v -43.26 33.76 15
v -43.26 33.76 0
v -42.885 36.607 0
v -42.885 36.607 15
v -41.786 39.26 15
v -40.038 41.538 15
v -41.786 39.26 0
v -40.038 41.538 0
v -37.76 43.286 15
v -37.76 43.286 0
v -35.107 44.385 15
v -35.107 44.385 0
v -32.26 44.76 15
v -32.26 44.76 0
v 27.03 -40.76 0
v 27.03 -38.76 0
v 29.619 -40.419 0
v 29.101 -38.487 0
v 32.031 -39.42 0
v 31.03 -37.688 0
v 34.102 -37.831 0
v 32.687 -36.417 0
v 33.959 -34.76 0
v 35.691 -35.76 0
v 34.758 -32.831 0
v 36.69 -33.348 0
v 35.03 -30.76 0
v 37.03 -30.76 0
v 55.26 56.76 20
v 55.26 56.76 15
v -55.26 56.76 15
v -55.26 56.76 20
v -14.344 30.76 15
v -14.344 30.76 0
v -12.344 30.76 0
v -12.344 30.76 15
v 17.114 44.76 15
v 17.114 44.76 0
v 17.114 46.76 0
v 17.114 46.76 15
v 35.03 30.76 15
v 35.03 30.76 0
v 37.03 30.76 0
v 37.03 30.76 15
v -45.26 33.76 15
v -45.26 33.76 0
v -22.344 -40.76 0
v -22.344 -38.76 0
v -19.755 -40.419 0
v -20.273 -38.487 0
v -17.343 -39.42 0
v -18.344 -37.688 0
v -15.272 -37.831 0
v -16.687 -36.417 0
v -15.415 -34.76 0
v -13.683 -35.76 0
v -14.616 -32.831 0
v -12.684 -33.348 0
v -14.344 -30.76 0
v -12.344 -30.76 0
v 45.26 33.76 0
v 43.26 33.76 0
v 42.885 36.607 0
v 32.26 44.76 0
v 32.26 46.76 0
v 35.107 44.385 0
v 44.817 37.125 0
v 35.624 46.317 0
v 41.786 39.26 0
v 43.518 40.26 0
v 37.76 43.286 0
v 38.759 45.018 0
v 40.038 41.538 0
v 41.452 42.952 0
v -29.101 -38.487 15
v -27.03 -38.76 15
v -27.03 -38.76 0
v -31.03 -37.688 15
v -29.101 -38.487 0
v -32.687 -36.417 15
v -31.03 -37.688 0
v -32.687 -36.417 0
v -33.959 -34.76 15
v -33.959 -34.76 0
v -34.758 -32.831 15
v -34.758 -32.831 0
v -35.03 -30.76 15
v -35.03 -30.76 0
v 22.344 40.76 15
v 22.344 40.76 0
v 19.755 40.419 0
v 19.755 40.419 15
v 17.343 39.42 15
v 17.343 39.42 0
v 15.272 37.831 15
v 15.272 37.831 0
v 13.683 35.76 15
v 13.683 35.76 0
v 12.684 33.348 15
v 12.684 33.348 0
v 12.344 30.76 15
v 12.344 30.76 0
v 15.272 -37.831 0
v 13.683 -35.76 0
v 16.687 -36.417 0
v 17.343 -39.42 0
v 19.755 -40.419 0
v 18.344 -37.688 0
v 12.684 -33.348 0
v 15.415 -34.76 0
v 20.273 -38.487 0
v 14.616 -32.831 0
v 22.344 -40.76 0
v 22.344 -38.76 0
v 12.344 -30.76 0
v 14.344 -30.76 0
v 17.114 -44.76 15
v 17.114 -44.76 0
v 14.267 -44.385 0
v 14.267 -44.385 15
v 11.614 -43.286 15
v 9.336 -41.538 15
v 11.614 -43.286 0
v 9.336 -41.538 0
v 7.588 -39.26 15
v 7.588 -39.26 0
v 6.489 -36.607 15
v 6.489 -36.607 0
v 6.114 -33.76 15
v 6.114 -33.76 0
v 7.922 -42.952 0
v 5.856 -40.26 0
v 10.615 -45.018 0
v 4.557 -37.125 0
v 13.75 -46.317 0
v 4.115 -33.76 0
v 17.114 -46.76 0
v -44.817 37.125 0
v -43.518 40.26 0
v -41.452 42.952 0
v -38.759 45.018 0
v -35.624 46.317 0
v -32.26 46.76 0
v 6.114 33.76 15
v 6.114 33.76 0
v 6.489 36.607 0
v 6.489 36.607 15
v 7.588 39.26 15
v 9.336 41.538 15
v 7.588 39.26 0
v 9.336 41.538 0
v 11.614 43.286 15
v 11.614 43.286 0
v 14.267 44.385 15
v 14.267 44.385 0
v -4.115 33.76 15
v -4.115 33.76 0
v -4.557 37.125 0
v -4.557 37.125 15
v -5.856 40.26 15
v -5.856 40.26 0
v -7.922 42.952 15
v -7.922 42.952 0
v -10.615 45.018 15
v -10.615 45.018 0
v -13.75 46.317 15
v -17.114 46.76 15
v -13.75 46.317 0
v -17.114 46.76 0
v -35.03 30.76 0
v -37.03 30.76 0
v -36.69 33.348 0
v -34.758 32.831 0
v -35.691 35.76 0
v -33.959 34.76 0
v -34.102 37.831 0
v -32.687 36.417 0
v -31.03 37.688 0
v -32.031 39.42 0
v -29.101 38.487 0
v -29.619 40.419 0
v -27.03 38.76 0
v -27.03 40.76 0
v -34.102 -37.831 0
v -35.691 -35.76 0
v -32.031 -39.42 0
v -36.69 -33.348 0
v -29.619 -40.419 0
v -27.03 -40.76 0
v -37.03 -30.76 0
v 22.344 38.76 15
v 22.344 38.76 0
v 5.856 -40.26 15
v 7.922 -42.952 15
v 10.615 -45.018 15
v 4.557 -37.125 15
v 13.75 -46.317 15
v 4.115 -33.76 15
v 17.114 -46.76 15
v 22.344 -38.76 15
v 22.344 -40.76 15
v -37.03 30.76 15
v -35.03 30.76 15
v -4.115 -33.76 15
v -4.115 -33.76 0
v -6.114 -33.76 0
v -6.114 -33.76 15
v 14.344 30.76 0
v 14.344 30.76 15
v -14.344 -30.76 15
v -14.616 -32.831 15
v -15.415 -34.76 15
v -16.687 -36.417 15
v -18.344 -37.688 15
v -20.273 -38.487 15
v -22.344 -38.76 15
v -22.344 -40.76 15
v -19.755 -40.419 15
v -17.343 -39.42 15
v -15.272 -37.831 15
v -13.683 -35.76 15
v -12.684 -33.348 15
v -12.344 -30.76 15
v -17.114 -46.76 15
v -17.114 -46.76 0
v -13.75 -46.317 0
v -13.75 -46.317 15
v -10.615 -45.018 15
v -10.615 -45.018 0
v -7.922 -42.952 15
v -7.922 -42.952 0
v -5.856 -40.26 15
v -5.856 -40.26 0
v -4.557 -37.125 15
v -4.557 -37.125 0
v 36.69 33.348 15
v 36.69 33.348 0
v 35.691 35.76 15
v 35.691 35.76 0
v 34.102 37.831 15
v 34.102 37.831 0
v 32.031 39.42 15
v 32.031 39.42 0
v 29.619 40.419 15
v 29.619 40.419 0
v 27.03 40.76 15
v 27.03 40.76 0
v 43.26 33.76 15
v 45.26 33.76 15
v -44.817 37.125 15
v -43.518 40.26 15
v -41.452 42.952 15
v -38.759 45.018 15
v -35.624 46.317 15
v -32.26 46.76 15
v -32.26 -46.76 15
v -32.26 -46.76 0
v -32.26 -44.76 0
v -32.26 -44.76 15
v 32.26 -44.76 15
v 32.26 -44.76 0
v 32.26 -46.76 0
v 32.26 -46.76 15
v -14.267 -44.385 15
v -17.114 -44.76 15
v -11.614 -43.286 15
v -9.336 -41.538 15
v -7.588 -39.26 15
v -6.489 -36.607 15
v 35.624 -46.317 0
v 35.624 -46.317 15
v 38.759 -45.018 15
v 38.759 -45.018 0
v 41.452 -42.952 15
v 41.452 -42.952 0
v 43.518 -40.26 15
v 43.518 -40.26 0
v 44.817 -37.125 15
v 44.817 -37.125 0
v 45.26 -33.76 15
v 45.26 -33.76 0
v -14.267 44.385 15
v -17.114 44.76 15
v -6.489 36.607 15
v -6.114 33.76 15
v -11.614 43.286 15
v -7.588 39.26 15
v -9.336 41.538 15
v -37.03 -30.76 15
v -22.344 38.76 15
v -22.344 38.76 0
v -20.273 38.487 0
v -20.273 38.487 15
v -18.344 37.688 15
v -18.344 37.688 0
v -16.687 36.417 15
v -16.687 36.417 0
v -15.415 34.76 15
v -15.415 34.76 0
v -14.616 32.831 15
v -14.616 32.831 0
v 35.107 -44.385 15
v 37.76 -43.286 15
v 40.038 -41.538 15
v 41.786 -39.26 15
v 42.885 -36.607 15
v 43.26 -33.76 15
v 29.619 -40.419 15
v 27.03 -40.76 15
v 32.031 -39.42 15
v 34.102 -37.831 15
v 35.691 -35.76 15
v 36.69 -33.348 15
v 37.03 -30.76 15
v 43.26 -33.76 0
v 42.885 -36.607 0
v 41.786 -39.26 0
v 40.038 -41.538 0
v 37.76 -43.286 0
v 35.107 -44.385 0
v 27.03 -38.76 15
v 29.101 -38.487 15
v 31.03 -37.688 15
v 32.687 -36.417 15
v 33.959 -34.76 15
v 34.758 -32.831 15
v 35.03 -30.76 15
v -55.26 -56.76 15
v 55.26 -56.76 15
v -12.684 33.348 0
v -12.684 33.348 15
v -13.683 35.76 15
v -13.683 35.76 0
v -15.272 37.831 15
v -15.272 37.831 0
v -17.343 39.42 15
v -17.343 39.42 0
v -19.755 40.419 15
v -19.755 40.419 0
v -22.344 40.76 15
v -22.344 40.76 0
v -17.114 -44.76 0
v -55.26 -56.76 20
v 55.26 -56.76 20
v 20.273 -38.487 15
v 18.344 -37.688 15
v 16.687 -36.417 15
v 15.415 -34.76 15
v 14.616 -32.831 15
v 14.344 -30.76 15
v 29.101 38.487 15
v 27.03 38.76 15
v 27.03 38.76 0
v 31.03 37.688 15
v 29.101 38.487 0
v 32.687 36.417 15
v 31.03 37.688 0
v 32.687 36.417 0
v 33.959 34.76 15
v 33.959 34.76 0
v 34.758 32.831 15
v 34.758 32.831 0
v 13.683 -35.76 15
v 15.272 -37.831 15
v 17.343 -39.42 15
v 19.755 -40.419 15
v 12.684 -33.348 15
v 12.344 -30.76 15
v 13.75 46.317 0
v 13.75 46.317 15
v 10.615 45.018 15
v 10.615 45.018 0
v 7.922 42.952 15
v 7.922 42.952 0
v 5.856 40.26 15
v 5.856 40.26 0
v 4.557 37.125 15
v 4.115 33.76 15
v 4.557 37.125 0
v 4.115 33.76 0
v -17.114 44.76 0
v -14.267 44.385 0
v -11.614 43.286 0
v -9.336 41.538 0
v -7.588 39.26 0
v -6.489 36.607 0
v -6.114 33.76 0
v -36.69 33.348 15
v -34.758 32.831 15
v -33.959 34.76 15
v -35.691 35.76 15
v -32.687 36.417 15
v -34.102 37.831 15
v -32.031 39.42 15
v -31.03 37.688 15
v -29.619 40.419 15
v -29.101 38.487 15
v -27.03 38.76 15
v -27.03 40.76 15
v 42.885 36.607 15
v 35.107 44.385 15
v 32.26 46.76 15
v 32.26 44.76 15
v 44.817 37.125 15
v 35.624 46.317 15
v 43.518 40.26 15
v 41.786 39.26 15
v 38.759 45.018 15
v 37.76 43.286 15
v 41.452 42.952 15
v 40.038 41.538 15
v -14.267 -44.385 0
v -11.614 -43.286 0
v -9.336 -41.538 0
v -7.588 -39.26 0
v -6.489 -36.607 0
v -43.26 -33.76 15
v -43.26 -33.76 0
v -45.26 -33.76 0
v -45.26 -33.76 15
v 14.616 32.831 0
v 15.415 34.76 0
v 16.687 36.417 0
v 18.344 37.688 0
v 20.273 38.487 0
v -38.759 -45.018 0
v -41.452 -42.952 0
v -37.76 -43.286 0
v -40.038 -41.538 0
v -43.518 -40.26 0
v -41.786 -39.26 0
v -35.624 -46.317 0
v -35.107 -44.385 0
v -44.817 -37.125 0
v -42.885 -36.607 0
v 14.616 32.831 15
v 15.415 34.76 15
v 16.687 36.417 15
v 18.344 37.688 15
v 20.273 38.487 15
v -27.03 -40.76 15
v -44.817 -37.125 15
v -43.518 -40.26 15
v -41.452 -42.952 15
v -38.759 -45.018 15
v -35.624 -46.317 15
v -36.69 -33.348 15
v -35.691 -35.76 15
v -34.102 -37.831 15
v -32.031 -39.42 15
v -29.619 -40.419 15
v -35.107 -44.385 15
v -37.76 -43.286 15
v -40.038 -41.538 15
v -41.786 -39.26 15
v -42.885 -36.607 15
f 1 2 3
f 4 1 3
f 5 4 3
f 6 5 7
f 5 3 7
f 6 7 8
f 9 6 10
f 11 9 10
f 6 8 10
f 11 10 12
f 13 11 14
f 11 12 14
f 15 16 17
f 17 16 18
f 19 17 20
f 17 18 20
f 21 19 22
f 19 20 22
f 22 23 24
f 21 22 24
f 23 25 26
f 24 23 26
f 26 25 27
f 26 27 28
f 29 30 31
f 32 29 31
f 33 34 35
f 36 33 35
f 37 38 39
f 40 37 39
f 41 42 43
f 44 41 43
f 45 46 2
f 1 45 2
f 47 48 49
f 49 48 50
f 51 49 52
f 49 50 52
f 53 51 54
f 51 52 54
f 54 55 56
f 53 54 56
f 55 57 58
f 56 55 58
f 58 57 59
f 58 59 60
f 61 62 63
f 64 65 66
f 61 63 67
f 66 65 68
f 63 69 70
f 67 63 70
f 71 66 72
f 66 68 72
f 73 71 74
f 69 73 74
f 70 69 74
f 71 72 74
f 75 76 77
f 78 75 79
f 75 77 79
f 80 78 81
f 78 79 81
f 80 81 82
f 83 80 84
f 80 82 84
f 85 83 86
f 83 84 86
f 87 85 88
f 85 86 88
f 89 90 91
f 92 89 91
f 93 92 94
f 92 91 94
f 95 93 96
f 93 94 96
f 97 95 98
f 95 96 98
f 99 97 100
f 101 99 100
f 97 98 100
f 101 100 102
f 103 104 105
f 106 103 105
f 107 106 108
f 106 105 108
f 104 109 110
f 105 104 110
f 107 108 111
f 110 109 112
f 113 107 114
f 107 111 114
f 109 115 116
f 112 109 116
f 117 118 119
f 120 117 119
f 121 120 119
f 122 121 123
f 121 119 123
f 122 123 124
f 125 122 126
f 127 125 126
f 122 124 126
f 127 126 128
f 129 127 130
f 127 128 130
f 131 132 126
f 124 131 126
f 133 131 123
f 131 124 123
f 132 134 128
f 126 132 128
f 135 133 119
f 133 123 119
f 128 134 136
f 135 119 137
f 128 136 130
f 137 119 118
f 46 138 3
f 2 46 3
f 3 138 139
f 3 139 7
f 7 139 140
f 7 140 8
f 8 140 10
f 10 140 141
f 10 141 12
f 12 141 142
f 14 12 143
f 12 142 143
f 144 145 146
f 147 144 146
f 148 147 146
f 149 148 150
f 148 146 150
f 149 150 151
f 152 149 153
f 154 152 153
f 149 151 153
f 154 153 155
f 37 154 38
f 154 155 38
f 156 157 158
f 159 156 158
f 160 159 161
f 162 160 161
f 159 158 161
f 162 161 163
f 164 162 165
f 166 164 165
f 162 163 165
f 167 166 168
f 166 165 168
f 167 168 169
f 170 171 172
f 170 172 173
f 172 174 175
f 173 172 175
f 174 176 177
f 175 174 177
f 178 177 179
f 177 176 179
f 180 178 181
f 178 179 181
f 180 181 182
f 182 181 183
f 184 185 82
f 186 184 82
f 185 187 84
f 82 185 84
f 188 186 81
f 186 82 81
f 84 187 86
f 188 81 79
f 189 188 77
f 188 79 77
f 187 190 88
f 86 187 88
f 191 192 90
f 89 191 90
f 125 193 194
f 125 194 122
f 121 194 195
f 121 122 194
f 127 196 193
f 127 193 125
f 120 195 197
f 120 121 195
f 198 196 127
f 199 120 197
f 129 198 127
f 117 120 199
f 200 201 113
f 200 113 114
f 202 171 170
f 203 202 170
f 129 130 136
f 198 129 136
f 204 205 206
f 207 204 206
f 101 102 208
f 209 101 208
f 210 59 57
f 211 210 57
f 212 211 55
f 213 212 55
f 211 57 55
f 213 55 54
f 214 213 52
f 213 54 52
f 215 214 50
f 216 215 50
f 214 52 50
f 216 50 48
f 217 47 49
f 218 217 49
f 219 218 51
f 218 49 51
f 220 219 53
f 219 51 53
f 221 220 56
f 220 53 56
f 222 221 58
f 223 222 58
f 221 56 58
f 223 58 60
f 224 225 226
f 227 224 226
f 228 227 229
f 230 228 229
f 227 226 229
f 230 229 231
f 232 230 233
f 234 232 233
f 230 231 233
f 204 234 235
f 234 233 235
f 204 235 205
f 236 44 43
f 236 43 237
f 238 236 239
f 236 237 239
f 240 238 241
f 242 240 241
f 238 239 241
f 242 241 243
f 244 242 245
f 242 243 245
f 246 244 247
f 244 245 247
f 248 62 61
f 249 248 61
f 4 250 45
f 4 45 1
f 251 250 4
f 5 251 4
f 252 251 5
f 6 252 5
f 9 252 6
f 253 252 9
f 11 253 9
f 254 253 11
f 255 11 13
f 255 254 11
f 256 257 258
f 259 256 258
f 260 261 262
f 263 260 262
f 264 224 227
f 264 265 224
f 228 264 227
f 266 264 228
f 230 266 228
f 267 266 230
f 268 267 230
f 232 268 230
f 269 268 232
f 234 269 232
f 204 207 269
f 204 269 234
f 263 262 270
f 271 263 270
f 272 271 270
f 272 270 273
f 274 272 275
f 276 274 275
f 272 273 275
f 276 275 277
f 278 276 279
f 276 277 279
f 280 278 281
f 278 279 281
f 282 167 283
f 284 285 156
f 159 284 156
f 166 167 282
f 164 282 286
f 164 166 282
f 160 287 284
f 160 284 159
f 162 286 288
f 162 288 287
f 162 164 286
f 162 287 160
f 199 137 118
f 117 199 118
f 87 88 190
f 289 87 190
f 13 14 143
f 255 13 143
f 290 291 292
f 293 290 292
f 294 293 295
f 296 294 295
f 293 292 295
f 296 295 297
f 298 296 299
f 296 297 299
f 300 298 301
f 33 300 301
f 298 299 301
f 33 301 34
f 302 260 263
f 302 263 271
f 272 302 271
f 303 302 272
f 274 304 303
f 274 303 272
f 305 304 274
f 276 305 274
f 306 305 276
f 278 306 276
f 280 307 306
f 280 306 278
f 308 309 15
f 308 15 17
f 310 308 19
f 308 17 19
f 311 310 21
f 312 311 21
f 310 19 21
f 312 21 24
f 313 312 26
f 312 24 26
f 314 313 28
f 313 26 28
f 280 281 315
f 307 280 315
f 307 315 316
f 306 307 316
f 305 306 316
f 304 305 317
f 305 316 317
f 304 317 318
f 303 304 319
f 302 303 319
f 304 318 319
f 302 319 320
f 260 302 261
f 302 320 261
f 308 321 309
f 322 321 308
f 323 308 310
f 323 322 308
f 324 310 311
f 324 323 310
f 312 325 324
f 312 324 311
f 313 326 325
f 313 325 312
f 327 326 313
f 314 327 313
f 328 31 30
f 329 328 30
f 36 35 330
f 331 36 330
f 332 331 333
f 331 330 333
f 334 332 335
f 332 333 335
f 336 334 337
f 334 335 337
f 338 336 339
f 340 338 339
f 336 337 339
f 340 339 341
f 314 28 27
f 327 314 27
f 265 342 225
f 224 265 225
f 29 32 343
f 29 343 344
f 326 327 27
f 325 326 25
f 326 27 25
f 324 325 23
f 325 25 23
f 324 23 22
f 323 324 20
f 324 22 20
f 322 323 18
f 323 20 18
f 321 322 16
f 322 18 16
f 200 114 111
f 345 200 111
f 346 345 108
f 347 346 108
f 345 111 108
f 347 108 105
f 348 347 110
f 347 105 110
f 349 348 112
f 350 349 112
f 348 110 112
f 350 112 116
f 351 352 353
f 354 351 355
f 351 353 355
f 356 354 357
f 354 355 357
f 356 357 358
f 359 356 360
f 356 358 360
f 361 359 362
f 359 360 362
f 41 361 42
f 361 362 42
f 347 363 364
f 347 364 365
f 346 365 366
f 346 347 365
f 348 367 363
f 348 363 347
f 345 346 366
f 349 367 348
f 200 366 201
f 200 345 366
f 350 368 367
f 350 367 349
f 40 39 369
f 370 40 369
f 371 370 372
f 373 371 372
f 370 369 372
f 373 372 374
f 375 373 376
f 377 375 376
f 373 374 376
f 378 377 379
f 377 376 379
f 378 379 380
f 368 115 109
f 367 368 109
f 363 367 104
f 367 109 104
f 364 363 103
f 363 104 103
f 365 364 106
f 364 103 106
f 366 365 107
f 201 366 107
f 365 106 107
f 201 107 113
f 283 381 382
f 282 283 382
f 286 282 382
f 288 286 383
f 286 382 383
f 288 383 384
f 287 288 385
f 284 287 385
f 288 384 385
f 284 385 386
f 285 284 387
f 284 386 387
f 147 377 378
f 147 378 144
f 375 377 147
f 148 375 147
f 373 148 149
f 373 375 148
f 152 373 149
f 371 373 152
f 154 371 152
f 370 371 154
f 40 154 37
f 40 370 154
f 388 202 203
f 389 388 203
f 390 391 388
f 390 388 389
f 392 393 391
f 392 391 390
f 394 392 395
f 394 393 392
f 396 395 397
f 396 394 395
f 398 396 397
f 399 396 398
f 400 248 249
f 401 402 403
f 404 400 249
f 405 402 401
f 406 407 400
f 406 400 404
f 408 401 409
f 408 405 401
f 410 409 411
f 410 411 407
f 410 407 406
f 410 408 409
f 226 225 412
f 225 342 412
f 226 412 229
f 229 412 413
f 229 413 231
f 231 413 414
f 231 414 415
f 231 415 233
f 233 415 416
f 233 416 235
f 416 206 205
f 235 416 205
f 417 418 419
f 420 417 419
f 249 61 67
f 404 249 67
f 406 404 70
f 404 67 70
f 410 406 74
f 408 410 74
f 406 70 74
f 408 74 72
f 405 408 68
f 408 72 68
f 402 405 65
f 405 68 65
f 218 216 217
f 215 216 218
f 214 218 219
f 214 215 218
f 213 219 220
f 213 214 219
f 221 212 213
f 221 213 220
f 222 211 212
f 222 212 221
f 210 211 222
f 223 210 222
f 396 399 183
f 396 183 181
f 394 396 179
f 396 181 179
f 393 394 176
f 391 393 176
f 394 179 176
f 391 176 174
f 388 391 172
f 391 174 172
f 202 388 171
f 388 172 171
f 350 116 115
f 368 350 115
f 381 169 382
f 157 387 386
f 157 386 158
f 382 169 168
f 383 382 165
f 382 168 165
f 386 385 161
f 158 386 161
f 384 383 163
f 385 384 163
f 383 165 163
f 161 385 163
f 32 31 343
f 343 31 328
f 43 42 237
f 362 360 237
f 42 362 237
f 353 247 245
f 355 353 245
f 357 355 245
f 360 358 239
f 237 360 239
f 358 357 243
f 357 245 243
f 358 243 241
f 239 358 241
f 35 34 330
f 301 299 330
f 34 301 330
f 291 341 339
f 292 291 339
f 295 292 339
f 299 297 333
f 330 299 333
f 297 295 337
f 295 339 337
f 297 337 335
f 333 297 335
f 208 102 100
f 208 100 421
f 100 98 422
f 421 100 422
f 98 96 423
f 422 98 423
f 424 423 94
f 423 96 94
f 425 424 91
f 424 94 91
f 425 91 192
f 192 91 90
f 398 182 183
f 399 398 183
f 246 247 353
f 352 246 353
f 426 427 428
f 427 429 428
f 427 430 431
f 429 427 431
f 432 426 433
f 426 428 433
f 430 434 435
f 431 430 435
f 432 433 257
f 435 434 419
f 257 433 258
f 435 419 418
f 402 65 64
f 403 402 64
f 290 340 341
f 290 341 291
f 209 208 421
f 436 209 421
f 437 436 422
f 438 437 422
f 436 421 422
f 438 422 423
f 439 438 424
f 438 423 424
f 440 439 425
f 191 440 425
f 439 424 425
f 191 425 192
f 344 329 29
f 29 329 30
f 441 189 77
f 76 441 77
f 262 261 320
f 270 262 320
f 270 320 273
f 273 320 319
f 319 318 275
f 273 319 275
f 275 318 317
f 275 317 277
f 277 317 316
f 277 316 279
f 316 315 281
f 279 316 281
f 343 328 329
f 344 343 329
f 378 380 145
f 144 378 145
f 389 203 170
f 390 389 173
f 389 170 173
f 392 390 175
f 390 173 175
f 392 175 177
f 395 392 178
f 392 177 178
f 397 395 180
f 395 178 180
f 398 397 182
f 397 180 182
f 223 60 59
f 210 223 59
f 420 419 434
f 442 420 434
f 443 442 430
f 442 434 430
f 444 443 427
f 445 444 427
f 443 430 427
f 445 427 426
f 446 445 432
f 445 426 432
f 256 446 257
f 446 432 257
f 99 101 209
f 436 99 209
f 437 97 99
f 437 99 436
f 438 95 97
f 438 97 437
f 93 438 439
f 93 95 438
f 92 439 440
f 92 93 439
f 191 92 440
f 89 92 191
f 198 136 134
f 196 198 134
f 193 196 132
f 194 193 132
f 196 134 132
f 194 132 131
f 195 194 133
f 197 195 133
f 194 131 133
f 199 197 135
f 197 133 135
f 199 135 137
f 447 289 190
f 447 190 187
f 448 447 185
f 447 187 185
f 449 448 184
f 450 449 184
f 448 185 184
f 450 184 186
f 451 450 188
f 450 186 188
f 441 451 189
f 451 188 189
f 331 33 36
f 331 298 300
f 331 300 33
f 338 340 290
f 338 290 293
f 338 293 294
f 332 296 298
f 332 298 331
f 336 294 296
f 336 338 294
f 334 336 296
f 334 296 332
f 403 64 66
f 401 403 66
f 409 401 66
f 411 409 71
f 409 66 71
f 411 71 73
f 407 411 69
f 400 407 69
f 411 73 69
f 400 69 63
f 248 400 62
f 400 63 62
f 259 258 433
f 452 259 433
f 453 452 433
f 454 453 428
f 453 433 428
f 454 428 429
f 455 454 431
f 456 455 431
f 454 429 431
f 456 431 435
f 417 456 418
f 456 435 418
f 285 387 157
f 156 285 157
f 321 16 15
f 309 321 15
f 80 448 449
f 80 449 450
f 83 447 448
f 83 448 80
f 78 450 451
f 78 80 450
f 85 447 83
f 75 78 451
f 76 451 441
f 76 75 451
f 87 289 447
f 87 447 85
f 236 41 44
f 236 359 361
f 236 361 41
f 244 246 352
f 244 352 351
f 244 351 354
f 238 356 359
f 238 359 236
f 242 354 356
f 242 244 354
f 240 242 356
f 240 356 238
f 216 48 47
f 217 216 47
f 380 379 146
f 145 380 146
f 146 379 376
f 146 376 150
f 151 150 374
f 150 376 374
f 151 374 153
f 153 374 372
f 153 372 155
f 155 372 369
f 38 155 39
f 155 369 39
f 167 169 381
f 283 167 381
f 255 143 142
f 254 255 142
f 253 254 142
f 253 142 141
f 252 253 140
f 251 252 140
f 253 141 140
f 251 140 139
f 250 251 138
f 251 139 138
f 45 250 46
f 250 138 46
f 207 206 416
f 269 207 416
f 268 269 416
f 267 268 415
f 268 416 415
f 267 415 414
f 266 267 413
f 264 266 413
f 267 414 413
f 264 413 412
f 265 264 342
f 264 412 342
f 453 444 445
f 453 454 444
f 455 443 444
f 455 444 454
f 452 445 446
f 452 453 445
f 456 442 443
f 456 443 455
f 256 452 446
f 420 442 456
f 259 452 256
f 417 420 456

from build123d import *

# Parameters (mm, degrees)
F1_DEPTH = 15
F3_DEPTH = 5


with BuildPart() as f1:
    # F0 (on Top) → F1 (new body)
    with BuildSketch(Plane.XY):
        with BuildLine():
            Line((22.3435, 38.76), (22.3435, 40.76))
            ThreePointArc((22.3435, 40.76), (15.272432, 37.831068), (12.3435, 30.76))
            Line((12.3435, 30.76), (14.3435, 30.76))
            ThreePointArc((14.3435, 30.76), (16.686646, 36.416854), (22.3435, 38.76))
        make_face()
        with BuildLine():
            Line((35.0305, 30.76), (37.0305, 30.76))
            ThreePointArc((37.0305, 30.76), (34.101568, 37.831068), (27.0305, 40.76))
            Line((27.0305, 40.76), (27.0305, 38.76))
            ThreePointArc((27.0305, 38.76), (32.687354, 36.416854), (35.0305, 30.76))
        make_face()
        with BuildLine():
            Line((43.2595, 33.76), (45.2595, 33.76))
            ThreePointArc((45.2595, 33.76), (41.451888, 42.952388), (32.2595, 46.76))
            Line((32.2595, 46.76), (32.2595, 44.76))
            ThreePointArc((32.2595, 44.76), (40.037675, 41.538175), (43.2595, 33.76))
        make_face()
        with BuildLine():
            Line((17.1145, 44.76), (17.1145, 46.76))
            ThreePointArc((17.1145, 46.76), (7.922112, 42.952388), (4.1145, 33.76))
            Line((4.1145, 33.76), (6.1145, 33.76))
            ThreePointArc((6.1145, 33.76), (9.336325, 41.538175), (17.1145, 44.76))
        make_face()
        with BuildLine():
            Line((6.1145, -33.76), (4.1145, -33.76))
            ThreePointArc((4.1145, -33.76), (7.922112, -42.952388), (17.1145, -46.76))
            Line((17.1145, -46.76), (17.1145, -44.76))
            ThreePointArc((17.1145, -44.76), (9.336325, -41.538175), (6.1145, -33.76))
        make_face()
        with BuildLine():
            Line((14.3435, -30.76), (12.3435, -30.76))
            ThreePointArc((12.3435, -30.76), (15.272432, -37.831068), (22.3435, -40.76))
            Line((22.3435, -40.76), (22.3435, -38.76))
            ThreePointArc((22.3435, -38.76), (16.686646, -36.416854), (14.3435, -30.76))
        make_face()
        with BuildLine():
            Line((27.0305, -38.76), (27.0305, -40.76))
            ThreePointArc((27.0305, -40.76), (34.101568, -37.831068), (37.0305, -30.76))
            Line((37.0305, -30.76), (35.0305, -30.76))
            ThreePointArc((35.0305, -30.76), (32.687354, -36.416854), (27.0305, -38.76))
        make_face()
        with BuildLine():
            Line((45.2595, -33.76), (43.2595, -33.76))
            ThreePointArc((43.2595, -33.76), (40.037675, -41.538175), (32.2595, -44.76))
            Line((32.2595, -44.76), (32.2595, -46.76))
            ThreePointArc((32.2595, -46.76), (41.451888, -42.952388), (45.2595, -33.76))
        make_face()
        with BuildLine():
            ThreePointArc((-4.1145, 33.76), (-7.922112, 42.952388), (-17.1145, 46.76))
            Line((-17.1145, 46.76), (-17.1145, 44.76))
            ThreePointArc((-17.1145, 44.76), (-9.336325, 41.538175), (-6.1145, 33.76))
            Line((-6.1145, 33.76), (-4.1145, 33.76))
        make_face()
        with BuildLine():
            Line((-14.3435, 30.76), (-12.3435, 30.76))
            ThreePointArc((-12.3435, 30.76), (-15.272432, 37.831068), (-22.3435, 40.76))
            Line((-22.3435, 40.76), (-22.3435, 38.76))
            ThreePointArc((-22.3435, 38.76), (-16.686646, 36.416854), (-14.3435, 30.76))
        make_face()
        with BuildLine():
            Line((-27.0305, 38.76), (-27.0305, 40.76))
            ThreePointArc((-27.0305, 40.76), (-34.101568, 37.831068), (-37.0305, 30.76))
            Line((-37.0305, 30.76), (-35.0305, 30.76))
            ThreePointArc((-35.0305, 30.76), (-32.687354, 36.416854), (-27.0305, 38.76))
        make_face()
        with BuildLine():
            ThreePointArc((-43.2595, 33.76), (-40.037675, 41.538175), (-32.2595, 44.76))
            Line((-32.2595, 44.76), (-32.2595, 46.76))
            ThreePointArc((-32.2595, 46.76), (-41.451888, 42.952388), (-45.2595, 33.76))
            Line((-45.2595, 33.76), (-43.2595, 33.76))
        make_face()
        with BuildLine():
            ThreePointArc((-17.1145, -46.76), (-7.922112, -42.952388), (-4.1145, -33.76))
            Line((-4.1145, -33.76), (-6.1145, -33.76))
            ThreePointArc((-6.1145, -33.76), (-9.336325, -41.538175), (-17.1145, -44.76))
            Line((-17.1145, -44.76), (-17.1145, -46.76))
        make_face()
        with BuildLine():
            Line((-22.3435, -38.76), (-22.3435, -40.76))
            ThreePointArc((-22.3435, -40.76), (-15.272432, -37.831068), (-12.3435, -30.76))
            Line((-12.3435, -30.76), (-14.3435, -30.76))
            ThreePointArc((-14.3435, -30.76), (-16.686646, -36.416854), (-22.3435, -38.76))
        make_face()
        with BuildLine():
            ThreePointArc((-37.0305, -30.76), (-34.101568, -37.831068), (-27.0305, -40.76))
            Line((-27.0305, -40.76), (-27.0305, -38.76))
            ThreePointArc((-27.0305, -38.76), (-32.687354, -36.416854), (-35.0305, -30.76))
            Line((-35.0305, -30.76), (-37.0305, -30.76))
        make_face()
        with BuildLine():
            Line((-32.2595, -46.76), (-32.2595, -44.76))
            ThreePointArc((-32.2595, -44.76), (-40.037675, -41.538175), (-43.2595, -33.76))
            Line((-43.2595, -33.76), (-45.2595, -33.76))
            ThreePointArc((-45.2595, -33.76), (-41.451888, -42.952388), (-32.2595, -46.76))
        make_face()
    extrude(amount=F1_DEPTH)


with BuildPart() as f3:
    # F2 (on face) → F3 (new body)
    with BuildSketch(Plane.XY.offset(15)):
        Polygon((55.2595, 0), (55.2595, 56.76), (0, 56.76), (-55.2595, 56.76), (-55.2595, 0), (-55.2595, -56.76), (0, -56.76), (55.2595, -56.76), align=None)
    extrude(amount=F3_DEPTH)


solid = Compound([f1.part, f3.part])
